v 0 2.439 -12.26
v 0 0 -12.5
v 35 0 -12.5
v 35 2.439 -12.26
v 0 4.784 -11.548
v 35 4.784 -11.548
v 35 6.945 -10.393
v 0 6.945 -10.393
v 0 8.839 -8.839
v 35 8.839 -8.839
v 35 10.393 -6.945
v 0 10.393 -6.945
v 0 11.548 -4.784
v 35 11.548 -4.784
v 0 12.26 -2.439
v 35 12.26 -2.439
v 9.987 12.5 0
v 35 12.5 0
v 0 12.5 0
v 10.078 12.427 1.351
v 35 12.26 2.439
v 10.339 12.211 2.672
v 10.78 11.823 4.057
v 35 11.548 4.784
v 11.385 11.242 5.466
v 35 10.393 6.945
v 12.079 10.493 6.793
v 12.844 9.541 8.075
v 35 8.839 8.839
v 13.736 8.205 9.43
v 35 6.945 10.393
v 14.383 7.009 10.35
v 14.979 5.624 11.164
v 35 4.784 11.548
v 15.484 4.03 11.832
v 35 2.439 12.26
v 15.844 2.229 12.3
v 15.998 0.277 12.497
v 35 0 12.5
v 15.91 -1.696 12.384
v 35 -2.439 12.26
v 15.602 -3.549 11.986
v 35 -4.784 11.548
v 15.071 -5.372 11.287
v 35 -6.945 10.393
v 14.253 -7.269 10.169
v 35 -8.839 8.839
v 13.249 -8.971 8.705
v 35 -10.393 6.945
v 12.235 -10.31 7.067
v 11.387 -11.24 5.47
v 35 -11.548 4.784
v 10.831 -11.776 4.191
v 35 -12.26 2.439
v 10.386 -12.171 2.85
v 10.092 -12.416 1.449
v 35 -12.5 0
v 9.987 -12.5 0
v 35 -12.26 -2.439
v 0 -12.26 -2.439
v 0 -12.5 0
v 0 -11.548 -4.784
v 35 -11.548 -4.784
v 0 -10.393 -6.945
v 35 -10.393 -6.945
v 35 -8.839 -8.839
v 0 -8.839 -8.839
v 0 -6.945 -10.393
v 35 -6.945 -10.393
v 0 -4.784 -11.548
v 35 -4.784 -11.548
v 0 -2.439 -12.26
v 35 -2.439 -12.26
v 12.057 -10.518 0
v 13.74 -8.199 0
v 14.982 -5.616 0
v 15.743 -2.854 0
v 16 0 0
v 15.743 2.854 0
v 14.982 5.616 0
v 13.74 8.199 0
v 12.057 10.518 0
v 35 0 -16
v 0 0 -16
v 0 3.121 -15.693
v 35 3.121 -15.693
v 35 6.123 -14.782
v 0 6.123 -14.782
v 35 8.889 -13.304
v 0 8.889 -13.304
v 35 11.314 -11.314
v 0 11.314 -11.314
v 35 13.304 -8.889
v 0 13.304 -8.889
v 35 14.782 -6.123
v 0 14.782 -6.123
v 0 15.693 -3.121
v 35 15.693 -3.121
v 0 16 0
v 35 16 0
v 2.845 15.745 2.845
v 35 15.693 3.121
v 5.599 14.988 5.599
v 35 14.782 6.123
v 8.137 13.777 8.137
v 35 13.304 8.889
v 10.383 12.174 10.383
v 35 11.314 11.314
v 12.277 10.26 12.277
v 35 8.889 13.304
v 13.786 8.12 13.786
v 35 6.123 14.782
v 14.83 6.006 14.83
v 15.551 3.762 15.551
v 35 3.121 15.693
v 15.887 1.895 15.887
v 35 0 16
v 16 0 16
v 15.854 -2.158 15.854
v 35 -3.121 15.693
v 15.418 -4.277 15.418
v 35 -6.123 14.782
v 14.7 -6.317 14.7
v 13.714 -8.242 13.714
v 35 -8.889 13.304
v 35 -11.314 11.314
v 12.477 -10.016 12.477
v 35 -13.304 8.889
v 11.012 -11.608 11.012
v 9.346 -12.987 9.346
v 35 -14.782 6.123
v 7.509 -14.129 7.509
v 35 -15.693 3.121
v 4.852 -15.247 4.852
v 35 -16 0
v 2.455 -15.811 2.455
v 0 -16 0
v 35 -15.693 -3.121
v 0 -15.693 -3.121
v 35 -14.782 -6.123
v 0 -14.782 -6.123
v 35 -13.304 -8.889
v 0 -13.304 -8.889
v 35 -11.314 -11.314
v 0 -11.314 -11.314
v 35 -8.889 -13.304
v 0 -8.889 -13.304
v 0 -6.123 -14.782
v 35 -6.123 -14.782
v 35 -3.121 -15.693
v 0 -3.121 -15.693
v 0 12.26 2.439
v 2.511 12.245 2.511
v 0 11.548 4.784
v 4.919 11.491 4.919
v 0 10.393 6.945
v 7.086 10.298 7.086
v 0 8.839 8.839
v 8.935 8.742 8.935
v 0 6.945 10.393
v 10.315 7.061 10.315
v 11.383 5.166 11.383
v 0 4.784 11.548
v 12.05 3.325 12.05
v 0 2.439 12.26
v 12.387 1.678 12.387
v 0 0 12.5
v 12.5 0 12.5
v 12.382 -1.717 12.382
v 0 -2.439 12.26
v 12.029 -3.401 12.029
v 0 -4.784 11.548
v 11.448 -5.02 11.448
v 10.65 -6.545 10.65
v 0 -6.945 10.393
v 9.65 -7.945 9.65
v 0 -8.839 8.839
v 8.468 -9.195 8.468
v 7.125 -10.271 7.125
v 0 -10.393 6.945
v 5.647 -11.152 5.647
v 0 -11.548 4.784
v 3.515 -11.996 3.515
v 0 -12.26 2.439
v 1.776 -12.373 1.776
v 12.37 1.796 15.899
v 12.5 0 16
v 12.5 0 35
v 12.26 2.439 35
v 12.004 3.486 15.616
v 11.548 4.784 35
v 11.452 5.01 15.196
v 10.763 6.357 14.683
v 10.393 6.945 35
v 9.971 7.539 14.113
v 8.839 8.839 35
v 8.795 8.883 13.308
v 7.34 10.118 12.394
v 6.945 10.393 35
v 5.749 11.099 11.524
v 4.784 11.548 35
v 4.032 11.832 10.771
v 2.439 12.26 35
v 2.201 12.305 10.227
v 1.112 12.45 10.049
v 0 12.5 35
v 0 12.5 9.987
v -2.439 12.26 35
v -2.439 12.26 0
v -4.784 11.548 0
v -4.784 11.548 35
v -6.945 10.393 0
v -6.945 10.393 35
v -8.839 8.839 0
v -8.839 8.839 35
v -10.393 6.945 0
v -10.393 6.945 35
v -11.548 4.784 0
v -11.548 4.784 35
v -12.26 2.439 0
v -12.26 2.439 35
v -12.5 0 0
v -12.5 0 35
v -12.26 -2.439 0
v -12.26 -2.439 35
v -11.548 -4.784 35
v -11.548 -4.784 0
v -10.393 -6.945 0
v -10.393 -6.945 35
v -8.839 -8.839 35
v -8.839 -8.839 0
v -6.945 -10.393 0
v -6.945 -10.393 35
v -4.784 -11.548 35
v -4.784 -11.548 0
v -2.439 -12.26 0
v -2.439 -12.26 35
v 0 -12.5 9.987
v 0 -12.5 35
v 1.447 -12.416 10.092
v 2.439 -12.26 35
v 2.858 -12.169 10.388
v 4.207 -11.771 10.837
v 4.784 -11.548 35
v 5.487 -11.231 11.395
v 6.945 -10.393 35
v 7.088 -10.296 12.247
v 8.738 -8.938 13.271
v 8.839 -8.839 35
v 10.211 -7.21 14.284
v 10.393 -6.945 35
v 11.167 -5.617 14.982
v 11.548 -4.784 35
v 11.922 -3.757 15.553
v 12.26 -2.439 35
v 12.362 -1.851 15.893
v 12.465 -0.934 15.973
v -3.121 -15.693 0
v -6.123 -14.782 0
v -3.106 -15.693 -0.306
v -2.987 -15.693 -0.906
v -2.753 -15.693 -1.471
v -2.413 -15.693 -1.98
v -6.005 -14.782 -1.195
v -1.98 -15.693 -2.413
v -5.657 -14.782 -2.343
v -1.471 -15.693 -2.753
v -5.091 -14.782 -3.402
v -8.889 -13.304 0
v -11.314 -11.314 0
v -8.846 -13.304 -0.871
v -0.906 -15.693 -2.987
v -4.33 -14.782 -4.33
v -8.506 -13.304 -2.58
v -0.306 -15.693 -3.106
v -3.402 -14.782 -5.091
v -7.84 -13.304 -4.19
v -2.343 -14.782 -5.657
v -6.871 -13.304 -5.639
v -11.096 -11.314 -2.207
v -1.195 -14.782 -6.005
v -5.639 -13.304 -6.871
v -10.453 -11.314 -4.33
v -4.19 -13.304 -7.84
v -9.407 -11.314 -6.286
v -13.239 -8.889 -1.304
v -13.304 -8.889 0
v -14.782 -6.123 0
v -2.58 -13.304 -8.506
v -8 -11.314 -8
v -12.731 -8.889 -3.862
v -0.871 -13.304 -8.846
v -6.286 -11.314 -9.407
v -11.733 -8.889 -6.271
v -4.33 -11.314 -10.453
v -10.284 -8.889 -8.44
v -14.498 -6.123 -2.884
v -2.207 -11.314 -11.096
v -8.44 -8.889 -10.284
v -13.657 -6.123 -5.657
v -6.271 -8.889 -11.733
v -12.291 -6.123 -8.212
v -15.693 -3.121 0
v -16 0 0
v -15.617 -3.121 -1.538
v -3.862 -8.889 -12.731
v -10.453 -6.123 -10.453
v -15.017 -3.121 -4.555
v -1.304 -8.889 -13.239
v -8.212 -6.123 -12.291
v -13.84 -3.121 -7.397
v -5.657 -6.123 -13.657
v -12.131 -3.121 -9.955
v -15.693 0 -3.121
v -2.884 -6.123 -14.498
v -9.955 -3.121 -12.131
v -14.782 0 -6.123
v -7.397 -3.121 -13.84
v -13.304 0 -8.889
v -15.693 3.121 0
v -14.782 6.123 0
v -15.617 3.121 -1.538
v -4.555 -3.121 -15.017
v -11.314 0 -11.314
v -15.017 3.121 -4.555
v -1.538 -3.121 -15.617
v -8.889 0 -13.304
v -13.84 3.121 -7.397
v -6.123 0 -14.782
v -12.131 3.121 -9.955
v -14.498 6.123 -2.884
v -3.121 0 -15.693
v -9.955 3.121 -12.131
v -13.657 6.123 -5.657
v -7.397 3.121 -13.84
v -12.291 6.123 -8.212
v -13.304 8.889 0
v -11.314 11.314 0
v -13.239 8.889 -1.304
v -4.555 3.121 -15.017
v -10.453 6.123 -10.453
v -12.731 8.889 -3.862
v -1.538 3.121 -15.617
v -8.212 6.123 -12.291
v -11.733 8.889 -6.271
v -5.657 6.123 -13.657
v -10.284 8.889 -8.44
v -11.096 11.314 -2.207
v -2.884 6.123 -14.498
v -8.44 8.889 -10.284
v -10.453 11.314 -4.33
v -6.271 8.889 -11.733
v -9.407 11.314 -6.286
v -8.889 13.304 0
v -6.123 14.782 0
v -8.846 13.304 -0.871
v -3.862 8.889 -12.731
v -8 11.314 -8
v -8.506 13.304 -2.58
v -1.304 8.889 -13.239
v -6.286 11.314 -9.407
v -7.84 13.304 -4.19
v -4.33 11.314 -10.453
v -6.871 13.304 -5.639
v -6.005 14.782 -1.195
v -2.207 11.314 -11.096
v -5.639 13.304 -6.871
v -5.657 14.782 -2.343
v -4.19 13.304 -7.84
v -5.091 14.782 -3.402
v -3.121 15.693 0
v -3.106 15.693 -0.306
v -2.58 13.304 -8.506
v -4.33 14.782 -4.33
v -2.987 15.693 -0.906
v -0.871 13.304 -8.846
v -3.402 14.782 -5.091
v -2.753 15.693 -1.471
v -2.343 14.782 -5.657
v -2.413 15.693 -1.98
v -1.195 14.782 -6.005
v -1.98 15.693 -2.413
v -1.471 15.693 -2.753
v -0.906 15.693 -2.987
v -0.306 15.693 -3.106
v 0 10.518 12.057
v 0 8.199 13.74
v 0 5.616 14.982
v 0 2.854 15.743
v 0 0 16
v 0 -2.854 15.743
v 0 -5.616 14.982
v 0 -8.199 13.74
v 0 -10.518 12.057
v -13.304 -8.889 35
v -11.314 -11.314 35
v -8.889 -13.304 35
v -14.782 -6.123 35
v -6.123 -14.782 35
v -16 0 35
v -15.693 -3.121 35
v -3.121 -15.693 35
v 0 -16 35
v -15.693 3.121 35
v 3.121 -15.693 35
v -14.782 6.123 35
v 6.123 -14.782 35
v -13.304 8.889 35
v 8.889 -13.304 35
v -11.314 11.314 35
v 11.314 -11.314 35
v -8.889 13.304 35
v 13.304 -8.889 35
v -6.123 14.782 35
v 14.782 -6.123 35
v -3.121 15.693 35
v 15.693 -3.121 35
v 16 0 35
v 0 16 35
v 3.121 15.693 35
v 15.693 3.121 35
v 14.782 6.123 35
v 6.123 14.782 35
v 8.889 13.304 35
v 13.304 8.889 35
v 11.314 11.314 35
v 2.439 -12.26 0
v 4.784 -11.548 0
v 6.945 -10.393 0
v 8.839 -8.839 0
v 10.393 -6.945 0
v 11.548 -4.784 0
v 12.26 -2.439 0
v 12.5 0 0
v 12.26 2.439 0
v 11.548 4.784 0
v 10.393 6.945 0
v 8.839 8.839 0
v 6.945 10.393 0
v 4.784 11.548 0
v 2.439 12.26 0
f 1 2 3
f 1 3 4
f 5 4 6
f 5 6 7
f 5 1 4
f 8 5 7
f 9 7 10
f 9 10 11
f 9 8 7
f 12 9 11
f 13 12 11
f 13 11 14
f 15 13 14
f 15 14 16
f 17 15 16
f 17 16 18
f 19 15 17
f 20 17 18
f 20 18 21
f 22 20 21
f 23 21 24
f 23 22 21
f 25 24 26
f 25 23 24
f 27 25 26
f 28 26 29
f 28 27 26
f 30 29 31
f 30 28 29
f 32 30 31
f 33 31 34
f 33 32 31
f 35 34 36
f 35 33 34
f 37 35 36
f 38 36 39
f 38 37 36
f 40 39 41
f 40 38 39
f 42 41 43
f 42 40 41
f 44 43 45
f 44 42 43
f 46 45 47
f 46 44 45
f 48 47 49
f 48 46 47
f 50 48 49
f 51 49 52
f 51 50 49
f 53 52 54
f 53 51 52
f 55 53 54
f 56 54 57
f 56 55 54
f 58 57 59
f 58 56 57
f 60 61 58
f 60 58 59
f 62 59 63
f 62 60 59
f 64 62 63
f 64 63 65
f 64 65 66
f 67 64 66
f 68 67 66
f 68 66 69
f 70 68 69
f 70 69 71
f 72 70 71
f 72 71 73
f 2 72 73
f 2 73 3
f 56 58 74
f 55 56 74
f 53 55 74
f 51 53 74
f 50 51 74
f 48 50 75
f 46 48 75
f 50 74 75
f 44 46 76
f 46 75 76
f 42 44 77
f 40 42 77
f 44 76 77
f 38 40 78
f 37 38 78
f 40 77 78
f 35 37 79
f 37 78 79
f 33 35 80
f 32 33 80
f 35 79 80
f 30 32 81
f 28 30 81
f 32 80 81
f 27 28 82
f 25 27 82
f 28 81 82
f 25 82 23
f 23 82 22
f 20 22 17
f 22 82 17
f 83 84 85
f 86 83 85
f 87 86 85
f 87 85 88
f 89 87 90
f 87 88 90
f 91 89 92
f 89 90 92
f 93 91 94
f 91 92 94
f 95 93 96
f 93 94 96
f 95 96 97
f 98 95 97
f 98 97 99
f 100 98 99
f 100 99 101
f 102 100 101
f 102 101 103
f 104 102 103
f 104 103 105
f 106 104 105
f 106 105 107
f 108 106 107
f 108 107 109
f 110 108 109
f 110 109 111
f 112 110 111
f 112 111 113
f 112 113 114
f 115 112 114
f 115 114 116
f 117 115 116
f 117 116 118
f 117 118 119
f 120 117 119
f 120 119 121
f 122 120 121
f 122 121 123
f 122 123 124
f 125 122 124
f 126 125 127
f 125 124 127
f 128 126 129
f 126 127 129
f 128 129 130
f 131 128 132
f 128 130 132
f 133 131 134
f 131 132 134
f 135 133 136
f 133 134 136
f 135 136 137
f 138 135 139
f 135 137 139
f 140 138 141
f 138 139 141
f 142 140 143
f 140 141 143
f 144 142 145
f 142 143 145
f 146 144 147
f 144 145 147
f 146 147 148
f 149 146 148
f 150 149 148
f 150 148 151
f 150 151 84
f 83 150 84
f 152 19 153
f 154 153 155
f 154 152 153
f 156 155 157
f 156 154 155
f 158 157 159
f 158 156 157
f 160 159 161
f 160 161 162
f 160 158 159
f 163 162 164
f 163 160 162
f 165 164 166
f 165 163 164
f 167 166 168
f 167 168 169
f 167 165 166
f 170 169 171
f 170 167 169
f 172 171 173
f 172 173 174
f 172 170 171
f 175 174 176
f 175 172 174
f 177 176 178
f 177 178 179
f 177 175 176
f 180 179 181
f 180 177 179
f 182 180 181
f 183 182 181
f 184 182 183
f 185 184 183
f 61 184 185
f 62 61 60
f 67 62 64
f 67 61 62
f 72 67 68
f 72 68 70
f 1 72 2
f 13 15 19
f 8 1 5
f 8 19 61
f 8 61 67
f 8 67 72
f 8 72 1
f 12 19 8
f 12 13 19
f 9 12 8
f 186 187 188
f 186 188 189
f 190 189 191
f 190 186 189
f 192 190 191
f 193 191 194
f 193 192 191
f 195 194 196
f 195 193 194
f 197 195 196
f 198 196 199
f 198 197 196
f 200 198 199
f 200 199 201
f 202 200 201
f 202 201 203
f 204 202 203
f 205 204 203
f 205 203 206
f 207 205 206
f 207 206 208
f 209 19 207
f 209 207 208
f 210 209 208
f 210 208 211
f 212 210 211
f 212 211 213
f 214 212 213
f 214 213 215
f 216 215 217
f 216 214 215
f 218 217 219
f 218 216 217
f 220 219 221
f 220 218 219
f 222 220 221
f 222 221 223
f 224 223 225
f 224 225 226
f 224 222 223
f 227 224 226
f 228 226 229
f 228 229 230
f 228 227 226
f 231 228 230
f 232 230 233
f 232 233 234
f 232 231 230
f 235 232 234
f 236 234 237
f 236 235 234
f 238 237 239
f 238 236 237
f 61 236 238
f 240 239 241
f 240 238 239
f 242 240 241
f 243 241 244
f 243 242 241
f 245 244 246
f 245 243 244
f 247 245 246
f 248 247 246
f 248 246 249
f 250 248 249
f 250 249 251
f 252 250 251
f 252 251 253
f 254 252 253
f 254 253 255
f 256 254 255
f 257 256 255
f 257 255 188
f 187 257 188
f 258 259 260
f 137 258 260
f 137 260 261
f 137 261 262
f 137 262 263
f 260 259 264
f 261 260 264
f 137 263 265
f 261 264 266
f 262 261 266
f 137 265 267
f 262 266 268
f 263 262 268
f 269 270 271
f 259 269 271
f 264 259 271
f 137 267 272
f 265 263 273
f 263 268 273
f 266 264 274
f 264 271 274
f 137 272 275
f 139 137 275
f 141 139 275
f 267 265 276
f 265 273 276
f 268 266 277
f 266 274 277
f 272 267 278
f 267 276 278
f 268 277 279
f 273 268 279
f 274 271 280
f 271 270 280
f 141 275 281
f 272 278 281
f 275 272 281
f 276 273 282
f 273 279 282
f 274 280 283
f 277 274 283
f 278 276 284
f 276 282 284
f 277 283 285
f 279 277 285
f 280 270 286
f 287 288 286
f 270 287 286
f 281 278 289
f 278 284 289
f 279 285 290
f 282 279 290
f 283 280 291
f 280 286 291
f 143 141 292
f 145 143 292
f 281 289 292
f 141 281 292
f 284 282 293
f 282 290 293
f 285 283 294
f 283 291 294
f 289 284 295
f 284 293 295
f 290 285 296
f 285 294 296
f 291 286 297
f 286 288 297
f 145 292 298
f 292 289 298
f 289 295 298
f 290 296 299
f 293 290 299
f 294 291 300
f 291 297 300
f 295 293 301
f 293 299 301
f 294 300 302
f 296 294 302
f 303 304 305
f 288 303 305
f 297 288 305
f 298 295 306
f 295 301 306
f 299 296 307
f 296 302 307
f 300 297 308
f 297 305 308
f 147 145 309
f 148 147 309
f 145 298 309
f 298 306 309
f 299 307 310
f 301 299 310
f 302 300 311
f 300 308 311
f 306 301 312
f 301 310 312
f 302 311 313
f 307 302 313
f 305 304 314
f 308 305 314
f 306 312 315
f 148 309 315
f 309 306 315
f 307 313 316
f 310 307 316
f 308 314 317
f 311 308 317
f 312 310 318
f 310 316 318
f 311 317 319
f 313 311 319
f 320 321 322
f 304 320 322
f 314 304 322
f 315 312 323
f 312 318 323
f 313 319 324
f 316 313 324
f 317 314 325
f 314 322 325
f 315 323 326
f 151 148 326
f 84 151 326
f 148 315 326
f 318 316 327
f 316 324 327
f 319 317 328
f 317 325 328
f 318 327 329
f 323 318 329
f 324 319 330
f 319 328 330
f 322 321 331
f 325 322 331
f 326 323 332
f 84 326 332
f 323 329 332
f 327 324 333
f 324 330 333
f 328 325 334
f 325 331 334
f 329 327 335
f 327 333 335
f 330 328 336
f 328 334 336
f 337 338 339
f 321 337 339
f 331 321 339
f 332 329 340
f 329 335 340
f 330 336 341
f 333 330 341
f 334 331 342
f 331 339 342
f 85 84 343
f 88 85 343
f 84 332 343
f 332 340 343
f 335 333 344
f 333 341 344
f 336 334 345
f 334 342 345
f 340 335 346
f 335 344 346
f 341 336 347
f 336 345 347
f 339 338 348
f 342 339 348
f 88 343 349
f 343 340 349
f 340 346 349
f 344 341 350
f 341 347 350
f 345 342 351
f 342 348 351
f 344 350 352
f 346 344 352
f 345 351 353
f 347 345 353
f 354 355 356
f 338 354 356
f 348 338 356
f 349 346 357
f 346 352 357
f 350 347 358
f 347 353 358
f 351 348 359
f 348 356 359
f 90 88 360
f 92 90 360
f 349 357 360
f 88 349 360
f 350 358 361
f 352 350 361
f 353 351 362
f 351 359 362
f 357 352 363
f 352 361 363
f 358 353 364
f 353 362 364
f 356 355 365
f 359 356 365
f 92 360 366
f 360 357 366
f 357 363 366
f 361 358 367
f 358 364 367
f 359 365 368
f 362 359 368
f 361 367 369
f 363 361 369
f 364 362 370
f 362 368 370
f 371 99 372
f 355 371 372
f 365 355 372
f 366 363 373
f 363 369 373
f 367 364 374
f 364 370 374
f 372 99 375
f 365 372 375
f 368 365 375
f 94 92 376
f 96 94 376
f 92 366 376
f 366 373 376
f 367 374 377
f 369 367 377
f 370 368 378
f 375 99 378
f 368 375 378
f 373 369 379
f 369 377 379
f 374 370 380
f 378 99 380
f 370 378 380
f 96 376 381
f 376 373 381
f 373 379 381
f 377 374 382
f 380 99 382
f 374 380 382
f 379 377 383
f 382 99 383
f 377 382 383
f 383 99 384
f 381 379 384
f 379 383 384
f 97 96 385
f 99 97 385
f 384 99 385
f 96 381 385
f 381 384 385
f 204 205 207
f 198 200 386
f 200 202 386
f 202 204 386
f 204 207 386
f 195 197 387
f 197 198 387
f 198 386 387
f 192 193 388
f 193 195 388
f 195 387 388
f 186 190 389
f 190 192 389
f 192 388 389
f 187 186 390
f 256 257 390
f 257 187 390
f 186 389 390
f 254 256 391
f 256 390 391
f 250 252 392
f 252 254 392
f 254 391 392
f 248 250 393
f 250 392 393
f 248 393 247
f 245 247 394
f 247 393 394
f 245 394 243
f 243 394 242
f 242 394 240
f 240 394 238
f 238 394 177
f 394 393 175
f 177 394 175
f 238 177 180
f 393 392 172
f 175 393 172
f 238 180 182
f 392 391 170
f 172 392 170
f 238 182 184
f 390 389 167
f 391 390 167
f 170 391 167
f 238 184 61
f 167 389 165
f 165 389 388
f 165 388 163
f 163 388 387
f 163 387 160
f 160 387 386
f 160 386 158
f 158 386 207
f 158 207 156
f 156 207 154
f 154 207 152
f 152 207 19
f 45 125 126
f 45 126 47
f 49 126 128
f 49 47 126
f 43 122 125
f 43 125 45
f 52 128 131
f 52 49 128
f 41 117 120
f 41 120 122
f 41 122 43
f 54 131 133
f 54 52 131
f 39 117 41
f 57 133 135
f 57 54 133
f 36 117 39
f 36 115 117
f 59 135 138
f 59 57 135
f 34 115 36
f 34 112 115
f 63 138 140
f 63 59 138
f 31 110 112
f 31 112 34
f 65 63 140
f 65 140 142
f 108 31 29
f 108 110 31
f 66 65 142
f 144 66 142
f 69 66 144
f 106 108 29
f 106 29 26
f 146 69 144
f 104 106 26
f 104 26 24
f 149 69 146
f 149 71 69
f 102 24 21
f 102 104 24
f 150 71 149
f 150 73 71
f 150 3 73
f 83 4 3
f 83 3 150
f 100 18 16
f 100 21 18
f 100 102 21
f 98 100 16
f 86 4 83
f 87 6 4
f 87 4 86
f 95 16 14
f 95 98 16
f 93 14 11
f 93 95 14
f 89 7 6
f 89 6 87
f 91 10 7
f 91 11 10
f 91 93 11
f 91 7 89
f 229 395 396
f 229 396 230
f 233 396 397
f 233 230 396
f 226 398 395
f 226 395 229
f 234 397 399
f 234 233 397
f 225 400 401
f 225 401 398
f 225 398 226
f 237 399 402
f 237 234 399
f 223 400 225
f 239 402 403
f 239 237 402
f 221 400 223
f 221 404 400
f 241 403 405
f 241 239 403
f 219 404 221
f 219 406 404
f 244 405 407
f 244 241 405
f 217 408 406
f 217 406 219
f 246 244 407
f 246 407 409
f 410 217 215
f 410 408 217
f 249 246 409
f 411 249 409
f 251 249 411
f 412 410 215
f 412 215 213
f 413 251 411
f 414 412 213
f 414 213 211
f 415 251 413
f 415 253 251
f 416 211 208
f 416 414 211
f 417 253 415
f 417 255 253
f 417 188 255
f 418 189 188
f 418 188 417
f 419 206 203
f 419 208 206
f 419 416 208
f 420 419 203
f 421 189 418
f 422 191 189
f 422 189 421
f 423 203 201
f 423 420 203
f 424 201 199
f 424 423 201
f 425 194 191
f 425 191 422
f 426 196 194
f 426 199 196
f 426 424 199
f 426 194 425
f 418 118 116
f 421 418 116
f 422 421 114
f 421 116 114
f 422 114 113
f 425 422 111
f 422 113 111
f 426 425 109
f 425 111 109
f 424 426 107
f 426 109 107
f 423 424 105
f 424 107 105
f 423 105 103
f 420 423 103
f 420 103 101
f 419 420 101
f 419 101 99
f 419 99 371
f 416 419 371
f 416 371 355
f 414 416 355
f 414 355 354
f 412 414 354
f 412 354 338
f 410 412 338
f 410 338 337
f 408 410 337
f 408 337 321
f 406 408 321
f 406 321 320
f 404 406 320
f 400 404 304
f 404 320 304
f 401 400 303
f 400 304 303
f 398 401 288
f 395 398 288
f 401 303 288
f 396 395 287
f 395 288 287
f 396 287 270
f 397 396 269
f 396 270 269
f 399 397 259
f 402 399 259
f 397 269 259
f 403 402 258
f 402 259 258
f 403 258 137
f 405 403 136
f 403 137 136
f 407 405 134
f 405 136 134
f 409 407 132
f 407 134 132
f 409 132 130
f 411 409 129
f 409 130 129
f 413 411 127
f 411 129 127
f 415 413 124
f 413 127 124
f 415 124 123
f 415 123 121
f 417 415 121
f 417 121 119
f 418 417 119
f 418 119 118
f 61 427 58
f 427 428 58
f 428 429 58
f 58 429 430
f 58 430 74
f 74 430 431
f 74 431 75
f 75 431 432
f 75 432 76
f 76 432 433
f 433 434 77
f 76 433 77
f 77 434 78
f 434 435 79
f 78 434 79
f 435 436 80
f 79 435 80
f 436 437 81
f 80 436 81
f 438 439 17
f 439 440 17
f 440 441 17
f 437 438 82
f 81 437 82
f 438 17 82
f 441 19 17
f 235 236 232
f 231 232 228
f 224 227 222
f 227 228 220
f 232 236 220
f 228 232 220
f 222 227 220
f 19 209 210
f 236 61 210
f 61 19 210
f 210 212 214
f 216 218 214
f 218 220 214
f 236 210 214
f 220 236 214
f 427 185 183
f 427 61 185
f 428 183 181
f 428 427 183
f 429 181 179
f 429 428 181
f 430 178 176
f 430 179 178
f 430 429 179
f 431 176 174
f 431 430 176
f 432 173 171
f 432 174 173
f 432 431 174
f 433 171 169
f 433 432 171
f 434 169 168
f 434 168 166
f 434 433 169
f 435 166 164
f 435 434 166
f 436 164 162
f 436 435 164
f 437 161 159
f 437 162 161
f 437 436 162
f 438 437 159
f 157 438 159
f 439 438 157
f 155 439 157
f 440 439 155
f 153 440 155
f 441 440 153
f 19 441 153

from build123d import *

# Parameters (mm, degrees)
SKETCH_1_R      = 16
SKETCH_1_R_2    = 12.5
EXTRUDE_1_DEPTH = 35
SKETCH_2_R      = 16
SKETCH_2_R_2    = 12.5
EXTRUDE_2_DEPTH = 35
REVOLVE_1_ANGLE = 90


with BuildPart() as part:
    # 草图1 → 凸台-拉伸1 (new body)
    with BuildSketch(Plane.XY):
        Circle(SKETCH_1_R)
        Circle(SKETCH_1_R_2, mode=Mode.SUBTRACT)
    extrude(amount=EXTRUDE_1_DEPTH)

    # 草图2 → 凸台-拉伸2 (add)
    with BuildSketch(Plane(origin=(0, 0, 0), x_dir=(0, 0, -1), z_dir=(1, 0, 0))):
        Circle(SKETCH_2_R)
        Circle(SKETCH_2_R_2, mode=Mode.SUBTRACT)
    extrude(amount=EXTRUDE_2_DEPTH)

    # 草图3 → 旋转1 (revolve)
    with BuildSketch(Plane.XY):
        with BuildLine():
            Line((0, 16), (0, -16))
            ThreePointArc((0, -16), (-16, 0), (0, 16))
        make_face()
    revolve(axis=Axis((0, 16, 0), (0, -1, 0)), revolution_arc=REVOLVE_1_ANGLE)


solid = part.part
